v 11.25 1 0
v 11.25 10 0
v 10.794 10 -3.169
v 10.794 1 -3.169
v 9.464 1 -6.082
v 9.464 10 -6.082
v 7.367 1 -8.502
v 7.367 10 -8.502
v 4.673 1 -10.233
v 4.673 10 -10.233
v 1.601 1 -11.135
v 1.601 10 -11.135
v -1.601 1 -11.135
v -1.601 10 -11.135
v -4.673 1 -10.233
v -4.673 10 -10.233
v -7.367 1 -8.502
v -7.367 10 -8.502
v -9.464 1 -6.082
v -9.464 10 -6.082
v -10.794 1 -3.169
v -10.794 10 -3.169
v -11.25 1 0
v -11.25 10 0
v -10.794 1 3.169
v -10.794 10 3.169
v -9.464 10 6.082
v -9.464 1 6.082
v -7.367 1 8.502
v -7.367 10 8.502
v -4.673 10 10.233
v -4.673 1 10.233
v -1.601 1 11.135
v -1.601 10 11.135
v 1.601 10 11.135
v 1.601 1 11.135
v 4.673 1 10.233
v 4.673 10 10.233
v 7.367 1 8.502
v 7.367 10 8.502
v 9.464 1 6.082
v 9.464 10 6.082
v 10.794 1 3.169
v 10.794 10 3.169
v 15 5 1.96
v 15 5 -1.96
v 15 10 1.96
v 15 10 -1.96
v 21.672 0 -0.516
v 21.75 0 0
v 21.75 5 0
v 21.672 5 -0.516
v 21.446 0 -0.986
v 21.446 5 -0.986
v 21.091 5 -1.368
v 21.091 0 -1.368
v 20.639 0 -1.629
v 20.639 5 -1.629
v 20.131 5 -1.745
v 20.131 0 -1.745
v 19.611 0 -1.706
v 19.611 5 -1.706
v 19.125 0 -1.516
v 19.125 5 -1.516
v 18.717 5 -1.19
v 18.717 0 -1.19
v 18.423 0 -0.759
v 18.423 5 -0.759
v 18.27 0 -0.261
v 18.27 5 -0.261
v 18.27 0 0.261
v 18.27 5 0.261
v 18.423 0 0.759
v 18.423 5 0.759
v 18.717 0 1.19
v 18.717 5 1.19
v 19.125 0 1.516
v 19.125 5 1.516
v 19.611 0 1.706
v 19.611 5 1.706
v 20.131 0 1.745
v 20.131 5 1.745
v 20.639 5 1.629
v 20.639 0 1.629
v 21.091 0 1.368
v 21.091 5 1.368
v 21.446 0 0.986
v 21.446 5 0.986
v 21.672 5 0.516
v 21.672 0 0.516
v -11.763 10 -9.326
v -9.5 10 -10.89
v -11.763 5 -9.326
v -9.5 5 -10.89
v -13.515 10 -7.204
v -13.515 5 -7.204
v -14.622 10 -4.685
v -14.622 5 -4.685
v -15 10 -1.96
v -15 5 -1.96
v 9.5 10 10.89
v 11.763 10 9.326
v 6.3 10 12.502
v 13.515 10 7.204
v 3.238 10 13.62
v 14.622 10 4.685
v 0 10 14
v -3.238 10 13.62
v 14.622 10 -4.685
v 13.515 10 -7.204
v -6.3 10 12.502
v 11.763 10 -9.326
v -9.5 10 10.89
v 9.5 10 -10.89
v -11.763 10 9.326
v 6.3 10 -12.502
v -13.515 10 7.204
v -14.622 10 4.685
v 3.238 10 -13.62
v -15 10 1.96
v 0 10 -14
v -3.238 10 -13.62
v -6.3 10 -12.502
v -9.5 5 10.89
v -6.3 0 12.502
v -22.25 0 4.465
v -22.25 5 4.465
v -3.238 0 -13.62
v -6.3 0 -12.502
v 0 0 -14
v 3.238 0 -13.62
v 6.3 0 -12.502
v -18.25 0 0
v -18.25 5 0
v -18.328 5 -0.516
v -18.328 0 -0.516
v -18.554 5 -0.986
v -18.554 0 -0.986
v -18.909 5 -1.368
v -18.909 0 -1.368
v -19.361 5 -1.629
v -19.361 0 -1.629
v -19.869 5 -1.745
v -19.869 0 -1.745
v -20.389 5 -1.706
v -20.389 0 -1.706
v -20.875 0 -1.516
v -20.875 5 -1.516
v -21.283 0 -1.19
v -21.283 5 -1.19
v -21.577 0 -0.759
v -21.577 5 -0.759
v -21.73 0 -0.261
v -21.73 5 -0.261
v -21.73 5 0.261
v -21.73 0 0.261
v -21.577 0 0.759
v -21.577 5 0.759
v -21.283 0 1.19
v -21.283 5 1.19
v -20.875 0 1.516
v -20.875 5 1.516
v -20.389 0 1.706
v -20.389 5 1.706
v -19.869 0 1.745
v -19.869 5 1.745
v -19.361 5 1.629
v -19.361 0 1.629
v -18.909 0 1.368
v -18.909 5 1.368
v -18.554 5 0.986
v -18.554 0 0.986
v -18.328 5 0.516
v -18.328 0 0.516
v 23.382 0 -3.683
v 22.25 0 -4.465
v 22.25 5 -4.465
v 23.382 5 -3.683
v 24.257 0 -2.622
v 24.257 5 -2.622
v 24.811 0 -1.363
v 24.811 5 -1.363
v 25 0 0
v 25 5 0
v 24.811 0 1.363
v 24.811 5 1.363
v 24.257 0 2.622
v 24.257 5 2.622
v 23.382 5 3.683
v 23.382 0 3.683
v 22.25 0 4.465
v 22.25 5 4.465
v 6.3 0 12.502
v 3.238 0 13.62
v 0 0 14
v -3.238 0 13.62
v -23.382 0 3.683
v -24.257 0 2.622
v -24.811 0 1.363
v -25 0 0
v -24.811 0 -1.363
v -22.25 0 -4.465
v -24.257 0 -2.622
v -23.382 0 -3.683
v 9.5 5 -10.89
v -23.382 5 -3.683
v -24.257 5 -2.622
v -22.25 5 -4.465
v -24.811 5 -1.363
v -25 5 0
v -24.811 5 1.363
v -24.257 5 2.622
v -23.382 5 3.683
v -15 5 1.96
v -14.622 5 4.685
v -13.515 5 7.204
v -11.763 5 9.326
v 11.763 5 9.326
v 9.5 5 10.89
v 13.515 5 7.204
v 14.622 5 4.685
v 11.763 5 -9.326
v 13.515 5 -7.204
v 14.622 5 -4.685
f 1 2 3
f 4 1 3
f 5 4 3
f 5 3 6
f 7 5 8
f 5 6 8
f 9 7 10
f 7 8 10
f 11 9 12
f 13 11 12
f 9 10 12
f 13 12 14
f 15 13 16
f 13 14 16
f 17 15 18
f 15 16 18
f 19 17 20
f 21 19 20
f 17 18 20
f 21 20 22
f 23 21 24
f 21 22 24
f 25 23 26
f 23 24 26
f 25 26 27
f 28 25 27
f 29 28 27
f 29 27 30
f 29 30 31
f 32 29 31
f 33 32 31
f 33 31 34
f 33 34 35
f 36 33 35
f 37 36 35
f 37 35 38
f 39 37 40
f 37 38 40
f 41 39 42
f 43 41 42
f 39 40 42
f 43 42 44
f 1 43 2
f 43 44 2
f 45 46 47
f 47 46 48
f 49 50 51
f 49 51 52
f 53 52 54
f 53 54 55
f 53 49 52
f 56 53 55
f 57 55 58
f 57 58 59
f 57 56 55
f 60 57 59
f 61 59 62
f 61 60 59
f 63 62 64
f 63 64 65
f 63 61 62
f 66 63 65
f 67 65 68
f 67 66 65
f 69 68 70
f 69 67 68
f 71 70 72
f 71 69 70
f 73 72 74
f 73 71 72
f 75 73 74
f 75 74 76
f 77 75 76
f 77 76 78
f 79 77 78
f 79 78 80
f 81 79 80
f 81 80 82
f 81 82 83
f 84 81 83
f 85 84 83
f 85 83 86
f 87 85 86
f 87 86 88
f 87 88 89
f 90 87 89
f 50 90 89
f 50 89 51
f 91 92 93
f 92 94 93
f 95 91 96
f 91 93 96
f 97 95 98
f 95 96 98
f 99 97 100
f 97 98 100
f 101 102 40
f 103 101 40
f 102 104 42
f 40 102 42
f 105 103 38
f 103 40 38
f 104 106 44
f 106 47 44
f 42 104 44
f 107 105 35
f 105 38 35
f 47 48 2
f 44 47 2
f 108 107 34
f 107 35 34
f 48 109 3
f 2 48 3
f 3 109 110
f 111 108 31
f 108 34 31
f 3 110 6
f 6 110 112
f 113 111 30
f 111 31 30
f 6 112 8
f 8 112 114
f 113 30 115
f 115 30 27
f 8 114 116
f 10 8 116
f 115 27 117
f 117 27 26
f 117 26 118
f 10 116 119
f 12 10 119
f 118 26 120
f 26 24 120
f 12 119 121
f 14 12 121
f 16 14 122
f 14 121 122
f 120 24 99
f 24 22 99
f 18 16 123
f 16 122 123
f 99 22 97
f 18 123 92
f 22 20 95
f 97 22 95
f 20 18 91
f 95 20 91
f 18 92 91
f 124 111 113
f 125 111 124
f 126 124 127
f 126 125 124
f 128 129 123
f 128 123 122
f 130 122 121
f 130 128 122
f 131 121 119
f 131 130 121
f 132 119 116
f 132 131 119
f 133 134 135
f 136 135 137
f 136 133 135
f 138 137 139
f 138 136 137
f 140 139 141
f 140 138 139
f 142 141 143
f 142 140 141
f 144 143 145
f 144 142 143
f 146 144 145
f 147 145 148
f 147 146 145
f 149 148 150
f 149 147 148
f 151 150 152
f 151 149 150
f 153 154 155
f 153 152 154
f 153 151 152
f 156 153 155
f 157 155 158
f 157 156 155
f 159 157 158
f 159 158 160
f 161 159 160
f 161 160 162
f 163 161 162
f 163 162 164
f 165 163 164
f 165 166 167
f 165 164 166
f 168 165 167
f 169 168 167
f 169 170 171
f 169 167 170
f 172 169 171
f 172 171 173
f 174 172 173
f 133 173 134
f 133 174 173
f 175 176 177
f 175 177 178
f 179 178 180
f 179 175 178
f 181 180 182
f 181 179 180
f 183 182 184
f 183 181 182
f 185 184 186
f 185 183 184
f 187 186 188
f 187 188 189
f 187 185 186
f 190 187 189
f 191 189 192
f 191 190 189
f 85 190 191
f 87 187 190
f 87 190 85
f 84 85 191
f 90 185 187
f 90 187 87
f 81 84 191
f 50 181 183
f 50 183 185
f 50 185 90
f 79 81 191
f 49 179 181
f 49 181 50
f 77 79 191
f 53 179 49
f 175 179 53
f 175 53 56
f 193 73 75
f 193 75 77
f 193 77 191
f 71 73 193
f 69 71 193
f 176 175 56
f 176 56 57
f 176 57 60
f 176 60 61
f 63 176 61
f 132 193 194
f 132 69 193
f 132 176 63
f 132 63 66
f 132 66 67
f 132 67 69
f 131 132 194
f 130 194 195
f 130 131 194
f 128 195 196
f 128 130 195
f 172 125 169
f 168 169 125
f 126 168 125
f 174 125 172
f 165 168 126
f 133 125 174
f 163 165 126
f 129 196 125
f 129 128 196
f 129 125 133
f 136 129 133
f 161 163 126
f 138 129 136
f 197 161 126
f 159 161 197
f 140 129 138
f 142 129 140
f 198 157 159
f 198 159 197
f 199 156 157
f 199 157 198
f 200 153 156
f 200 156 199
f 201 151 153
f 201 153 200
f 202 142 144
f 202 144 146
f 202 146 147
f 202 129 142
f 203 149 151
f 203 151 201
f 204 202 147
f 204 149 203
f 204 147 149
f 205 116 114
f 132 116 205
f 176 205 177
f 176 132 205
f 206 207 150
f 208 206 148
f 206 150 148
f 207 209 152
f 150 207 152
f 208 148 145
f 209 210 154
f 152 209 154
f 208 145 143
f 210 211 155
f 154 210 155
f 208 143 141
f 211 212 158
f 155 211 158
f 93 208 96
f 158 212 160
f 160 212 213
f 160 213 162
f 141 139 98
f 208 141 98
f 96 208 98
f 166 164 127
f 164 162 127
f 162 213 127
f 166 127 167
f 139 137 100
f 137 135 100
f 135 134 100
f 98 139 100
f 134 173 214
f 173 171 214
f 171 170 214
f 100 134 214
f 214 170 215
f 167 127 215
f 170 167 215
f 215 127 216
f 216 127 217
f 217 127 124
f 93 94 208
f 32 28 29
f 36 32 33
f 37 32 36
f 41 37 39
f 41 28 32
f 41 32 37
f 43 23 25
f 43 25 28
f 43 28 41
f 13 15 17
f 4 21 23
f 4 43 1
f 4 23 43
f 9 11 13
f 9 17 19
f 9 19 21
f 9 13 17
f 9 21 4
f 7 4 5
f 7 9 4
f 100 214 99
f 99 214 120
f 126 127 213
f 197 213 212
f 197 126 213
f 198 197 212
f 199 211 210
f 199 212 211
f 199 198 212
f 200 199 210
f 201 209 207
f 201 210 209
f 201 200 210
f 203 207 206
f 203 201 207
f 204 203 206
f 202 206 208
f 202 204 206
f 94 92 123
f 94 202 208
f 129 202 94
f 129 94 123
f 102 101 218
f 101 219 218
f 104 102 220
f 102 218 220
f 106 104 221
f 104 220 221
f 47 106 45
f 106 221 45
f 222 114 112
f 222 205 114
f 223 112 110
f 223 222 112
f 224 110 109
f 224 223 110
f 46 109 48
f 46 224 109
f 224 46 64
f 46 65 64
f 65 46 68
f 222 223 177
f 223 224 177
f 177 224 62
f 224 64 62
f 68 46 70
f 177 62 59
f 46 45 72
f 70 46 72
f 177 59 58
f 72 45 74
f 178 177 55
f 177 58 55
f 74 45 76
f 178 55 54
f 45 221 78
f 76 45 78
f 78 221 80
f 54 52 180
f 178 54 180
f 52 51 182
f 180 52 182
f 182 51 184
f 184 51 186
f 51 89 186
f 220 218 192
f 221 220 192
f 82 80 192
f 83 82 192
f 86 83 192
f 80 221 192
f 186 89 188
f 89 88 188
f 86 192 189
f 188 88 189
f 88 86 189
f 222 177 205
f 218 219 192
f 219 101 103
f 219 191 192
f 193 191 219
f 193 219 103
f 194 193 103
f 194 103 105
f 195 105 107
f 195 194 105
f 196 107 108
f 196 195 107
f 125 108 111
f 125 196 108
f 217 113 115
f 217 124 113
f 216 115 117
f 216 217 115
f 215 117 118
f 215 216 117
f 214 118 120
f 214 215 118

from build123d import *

# Parameters (mm, degrees)
SKETCH2_R               = 1.75
BOSS_EXTRUDE1_DEPTH     = 10
SKETCH3_R               = 11.25
CUT_EXTRUDE1_DEPTH      = 9
SKETCH4_W               = 10
SKETCH4_H               = 5
CUT_EXTRUDE2_DEPTH      = 15
CUT_EXTRUDE2_DEPTH_BACK = 15
FILLET1_R               = 10


with BuildPart() as part:
    # Sketch2 → Boss-Extrude1 (new body)
    with BuildSketch(Plane(origin=(0, 0, 0), x_dir=(1, 0, 0), z_dir=(0, 1, 0))):
        with BuildLine():
            Line((-22.25, 4.465142775), (-6.3, 12.50239977))
            ThreePointArc((-6.3, 12.50239977), (0, 14), (6.3, 12.50239977))
            Line((6.3, 12.50239977), (22.25, 4.465142775))
            ThreePointArc((22.25, 4.465142775), (25, 0), (22.25, -4.465142775))
            Line((22.25, -4.465142775), (6.3, -12.50239977))
            ThreePointArc((6.3, -12.50239977), (0, -14), (-6.3, -12.50239977))
            Line((-6.3, -12.50239977), (-22.25, -4.465142775))
            ThreePointArc((-22.25, -4.465142775), (-25, 0), (-22.25, 4.465142775))
        make_face()
        with Locations((-20, 0)):
            Circle(SKETCH2_R, mode=Mode.SUBTRACT)
        with Locations((20, 0)):
            Circle(SKETCH2_R, mode=Mode.SUBTRACT)
    extrude(amount=BOSS_EXTRUDE1_DEPTH)

    # Sketch3 → Cut-Extrude1 (cut)
    with BuildSketch(Plane(origin=(0, 10, 0), x_dir=(1, 0, 0), z_dir=(0, 1, 0))):
        Circle(SKETCH3_R)
    extrude(amount=-CUT_EXTRUDE1_DEPTH, mode=Mode.SUBTRACT)

    # Sketch4 → Cut-Extrude2 (cut, two sides)
    with BuildSketch(Plane.XY) as cut_extrude2_sk:
        with Locations((-20, 7.5)):
            Rectangle(SKETCH4_W, SKETCH4_H)
        with Locations((20, 7.5)):
            Rectangle(SKETCH4_W, SKETCH4_H)
    extrude(amount=CUT_EXTRUDE2_DEPTH, mode=Mode.SUBTRACT)
    extrude(cut_extrude2_sk.sketch, amount=-CUT_EXTRUDE2_DEPTH_BACK, mode=Mode.SUBTRACT)

    # Fillet1
    fillet1_edges = [part.edges().sort_by_distance(p)[0] for p in [
        (-15, 7.5, -8.118441409),
        (15, 7.5, -8.118441409),
        (-15, 7.5, 8.118441409),
        (15, 7.5, 8.118441409),
    ]]
    fillet(fillet1_edges, radius=FILLET1_R)


solid = part.part
